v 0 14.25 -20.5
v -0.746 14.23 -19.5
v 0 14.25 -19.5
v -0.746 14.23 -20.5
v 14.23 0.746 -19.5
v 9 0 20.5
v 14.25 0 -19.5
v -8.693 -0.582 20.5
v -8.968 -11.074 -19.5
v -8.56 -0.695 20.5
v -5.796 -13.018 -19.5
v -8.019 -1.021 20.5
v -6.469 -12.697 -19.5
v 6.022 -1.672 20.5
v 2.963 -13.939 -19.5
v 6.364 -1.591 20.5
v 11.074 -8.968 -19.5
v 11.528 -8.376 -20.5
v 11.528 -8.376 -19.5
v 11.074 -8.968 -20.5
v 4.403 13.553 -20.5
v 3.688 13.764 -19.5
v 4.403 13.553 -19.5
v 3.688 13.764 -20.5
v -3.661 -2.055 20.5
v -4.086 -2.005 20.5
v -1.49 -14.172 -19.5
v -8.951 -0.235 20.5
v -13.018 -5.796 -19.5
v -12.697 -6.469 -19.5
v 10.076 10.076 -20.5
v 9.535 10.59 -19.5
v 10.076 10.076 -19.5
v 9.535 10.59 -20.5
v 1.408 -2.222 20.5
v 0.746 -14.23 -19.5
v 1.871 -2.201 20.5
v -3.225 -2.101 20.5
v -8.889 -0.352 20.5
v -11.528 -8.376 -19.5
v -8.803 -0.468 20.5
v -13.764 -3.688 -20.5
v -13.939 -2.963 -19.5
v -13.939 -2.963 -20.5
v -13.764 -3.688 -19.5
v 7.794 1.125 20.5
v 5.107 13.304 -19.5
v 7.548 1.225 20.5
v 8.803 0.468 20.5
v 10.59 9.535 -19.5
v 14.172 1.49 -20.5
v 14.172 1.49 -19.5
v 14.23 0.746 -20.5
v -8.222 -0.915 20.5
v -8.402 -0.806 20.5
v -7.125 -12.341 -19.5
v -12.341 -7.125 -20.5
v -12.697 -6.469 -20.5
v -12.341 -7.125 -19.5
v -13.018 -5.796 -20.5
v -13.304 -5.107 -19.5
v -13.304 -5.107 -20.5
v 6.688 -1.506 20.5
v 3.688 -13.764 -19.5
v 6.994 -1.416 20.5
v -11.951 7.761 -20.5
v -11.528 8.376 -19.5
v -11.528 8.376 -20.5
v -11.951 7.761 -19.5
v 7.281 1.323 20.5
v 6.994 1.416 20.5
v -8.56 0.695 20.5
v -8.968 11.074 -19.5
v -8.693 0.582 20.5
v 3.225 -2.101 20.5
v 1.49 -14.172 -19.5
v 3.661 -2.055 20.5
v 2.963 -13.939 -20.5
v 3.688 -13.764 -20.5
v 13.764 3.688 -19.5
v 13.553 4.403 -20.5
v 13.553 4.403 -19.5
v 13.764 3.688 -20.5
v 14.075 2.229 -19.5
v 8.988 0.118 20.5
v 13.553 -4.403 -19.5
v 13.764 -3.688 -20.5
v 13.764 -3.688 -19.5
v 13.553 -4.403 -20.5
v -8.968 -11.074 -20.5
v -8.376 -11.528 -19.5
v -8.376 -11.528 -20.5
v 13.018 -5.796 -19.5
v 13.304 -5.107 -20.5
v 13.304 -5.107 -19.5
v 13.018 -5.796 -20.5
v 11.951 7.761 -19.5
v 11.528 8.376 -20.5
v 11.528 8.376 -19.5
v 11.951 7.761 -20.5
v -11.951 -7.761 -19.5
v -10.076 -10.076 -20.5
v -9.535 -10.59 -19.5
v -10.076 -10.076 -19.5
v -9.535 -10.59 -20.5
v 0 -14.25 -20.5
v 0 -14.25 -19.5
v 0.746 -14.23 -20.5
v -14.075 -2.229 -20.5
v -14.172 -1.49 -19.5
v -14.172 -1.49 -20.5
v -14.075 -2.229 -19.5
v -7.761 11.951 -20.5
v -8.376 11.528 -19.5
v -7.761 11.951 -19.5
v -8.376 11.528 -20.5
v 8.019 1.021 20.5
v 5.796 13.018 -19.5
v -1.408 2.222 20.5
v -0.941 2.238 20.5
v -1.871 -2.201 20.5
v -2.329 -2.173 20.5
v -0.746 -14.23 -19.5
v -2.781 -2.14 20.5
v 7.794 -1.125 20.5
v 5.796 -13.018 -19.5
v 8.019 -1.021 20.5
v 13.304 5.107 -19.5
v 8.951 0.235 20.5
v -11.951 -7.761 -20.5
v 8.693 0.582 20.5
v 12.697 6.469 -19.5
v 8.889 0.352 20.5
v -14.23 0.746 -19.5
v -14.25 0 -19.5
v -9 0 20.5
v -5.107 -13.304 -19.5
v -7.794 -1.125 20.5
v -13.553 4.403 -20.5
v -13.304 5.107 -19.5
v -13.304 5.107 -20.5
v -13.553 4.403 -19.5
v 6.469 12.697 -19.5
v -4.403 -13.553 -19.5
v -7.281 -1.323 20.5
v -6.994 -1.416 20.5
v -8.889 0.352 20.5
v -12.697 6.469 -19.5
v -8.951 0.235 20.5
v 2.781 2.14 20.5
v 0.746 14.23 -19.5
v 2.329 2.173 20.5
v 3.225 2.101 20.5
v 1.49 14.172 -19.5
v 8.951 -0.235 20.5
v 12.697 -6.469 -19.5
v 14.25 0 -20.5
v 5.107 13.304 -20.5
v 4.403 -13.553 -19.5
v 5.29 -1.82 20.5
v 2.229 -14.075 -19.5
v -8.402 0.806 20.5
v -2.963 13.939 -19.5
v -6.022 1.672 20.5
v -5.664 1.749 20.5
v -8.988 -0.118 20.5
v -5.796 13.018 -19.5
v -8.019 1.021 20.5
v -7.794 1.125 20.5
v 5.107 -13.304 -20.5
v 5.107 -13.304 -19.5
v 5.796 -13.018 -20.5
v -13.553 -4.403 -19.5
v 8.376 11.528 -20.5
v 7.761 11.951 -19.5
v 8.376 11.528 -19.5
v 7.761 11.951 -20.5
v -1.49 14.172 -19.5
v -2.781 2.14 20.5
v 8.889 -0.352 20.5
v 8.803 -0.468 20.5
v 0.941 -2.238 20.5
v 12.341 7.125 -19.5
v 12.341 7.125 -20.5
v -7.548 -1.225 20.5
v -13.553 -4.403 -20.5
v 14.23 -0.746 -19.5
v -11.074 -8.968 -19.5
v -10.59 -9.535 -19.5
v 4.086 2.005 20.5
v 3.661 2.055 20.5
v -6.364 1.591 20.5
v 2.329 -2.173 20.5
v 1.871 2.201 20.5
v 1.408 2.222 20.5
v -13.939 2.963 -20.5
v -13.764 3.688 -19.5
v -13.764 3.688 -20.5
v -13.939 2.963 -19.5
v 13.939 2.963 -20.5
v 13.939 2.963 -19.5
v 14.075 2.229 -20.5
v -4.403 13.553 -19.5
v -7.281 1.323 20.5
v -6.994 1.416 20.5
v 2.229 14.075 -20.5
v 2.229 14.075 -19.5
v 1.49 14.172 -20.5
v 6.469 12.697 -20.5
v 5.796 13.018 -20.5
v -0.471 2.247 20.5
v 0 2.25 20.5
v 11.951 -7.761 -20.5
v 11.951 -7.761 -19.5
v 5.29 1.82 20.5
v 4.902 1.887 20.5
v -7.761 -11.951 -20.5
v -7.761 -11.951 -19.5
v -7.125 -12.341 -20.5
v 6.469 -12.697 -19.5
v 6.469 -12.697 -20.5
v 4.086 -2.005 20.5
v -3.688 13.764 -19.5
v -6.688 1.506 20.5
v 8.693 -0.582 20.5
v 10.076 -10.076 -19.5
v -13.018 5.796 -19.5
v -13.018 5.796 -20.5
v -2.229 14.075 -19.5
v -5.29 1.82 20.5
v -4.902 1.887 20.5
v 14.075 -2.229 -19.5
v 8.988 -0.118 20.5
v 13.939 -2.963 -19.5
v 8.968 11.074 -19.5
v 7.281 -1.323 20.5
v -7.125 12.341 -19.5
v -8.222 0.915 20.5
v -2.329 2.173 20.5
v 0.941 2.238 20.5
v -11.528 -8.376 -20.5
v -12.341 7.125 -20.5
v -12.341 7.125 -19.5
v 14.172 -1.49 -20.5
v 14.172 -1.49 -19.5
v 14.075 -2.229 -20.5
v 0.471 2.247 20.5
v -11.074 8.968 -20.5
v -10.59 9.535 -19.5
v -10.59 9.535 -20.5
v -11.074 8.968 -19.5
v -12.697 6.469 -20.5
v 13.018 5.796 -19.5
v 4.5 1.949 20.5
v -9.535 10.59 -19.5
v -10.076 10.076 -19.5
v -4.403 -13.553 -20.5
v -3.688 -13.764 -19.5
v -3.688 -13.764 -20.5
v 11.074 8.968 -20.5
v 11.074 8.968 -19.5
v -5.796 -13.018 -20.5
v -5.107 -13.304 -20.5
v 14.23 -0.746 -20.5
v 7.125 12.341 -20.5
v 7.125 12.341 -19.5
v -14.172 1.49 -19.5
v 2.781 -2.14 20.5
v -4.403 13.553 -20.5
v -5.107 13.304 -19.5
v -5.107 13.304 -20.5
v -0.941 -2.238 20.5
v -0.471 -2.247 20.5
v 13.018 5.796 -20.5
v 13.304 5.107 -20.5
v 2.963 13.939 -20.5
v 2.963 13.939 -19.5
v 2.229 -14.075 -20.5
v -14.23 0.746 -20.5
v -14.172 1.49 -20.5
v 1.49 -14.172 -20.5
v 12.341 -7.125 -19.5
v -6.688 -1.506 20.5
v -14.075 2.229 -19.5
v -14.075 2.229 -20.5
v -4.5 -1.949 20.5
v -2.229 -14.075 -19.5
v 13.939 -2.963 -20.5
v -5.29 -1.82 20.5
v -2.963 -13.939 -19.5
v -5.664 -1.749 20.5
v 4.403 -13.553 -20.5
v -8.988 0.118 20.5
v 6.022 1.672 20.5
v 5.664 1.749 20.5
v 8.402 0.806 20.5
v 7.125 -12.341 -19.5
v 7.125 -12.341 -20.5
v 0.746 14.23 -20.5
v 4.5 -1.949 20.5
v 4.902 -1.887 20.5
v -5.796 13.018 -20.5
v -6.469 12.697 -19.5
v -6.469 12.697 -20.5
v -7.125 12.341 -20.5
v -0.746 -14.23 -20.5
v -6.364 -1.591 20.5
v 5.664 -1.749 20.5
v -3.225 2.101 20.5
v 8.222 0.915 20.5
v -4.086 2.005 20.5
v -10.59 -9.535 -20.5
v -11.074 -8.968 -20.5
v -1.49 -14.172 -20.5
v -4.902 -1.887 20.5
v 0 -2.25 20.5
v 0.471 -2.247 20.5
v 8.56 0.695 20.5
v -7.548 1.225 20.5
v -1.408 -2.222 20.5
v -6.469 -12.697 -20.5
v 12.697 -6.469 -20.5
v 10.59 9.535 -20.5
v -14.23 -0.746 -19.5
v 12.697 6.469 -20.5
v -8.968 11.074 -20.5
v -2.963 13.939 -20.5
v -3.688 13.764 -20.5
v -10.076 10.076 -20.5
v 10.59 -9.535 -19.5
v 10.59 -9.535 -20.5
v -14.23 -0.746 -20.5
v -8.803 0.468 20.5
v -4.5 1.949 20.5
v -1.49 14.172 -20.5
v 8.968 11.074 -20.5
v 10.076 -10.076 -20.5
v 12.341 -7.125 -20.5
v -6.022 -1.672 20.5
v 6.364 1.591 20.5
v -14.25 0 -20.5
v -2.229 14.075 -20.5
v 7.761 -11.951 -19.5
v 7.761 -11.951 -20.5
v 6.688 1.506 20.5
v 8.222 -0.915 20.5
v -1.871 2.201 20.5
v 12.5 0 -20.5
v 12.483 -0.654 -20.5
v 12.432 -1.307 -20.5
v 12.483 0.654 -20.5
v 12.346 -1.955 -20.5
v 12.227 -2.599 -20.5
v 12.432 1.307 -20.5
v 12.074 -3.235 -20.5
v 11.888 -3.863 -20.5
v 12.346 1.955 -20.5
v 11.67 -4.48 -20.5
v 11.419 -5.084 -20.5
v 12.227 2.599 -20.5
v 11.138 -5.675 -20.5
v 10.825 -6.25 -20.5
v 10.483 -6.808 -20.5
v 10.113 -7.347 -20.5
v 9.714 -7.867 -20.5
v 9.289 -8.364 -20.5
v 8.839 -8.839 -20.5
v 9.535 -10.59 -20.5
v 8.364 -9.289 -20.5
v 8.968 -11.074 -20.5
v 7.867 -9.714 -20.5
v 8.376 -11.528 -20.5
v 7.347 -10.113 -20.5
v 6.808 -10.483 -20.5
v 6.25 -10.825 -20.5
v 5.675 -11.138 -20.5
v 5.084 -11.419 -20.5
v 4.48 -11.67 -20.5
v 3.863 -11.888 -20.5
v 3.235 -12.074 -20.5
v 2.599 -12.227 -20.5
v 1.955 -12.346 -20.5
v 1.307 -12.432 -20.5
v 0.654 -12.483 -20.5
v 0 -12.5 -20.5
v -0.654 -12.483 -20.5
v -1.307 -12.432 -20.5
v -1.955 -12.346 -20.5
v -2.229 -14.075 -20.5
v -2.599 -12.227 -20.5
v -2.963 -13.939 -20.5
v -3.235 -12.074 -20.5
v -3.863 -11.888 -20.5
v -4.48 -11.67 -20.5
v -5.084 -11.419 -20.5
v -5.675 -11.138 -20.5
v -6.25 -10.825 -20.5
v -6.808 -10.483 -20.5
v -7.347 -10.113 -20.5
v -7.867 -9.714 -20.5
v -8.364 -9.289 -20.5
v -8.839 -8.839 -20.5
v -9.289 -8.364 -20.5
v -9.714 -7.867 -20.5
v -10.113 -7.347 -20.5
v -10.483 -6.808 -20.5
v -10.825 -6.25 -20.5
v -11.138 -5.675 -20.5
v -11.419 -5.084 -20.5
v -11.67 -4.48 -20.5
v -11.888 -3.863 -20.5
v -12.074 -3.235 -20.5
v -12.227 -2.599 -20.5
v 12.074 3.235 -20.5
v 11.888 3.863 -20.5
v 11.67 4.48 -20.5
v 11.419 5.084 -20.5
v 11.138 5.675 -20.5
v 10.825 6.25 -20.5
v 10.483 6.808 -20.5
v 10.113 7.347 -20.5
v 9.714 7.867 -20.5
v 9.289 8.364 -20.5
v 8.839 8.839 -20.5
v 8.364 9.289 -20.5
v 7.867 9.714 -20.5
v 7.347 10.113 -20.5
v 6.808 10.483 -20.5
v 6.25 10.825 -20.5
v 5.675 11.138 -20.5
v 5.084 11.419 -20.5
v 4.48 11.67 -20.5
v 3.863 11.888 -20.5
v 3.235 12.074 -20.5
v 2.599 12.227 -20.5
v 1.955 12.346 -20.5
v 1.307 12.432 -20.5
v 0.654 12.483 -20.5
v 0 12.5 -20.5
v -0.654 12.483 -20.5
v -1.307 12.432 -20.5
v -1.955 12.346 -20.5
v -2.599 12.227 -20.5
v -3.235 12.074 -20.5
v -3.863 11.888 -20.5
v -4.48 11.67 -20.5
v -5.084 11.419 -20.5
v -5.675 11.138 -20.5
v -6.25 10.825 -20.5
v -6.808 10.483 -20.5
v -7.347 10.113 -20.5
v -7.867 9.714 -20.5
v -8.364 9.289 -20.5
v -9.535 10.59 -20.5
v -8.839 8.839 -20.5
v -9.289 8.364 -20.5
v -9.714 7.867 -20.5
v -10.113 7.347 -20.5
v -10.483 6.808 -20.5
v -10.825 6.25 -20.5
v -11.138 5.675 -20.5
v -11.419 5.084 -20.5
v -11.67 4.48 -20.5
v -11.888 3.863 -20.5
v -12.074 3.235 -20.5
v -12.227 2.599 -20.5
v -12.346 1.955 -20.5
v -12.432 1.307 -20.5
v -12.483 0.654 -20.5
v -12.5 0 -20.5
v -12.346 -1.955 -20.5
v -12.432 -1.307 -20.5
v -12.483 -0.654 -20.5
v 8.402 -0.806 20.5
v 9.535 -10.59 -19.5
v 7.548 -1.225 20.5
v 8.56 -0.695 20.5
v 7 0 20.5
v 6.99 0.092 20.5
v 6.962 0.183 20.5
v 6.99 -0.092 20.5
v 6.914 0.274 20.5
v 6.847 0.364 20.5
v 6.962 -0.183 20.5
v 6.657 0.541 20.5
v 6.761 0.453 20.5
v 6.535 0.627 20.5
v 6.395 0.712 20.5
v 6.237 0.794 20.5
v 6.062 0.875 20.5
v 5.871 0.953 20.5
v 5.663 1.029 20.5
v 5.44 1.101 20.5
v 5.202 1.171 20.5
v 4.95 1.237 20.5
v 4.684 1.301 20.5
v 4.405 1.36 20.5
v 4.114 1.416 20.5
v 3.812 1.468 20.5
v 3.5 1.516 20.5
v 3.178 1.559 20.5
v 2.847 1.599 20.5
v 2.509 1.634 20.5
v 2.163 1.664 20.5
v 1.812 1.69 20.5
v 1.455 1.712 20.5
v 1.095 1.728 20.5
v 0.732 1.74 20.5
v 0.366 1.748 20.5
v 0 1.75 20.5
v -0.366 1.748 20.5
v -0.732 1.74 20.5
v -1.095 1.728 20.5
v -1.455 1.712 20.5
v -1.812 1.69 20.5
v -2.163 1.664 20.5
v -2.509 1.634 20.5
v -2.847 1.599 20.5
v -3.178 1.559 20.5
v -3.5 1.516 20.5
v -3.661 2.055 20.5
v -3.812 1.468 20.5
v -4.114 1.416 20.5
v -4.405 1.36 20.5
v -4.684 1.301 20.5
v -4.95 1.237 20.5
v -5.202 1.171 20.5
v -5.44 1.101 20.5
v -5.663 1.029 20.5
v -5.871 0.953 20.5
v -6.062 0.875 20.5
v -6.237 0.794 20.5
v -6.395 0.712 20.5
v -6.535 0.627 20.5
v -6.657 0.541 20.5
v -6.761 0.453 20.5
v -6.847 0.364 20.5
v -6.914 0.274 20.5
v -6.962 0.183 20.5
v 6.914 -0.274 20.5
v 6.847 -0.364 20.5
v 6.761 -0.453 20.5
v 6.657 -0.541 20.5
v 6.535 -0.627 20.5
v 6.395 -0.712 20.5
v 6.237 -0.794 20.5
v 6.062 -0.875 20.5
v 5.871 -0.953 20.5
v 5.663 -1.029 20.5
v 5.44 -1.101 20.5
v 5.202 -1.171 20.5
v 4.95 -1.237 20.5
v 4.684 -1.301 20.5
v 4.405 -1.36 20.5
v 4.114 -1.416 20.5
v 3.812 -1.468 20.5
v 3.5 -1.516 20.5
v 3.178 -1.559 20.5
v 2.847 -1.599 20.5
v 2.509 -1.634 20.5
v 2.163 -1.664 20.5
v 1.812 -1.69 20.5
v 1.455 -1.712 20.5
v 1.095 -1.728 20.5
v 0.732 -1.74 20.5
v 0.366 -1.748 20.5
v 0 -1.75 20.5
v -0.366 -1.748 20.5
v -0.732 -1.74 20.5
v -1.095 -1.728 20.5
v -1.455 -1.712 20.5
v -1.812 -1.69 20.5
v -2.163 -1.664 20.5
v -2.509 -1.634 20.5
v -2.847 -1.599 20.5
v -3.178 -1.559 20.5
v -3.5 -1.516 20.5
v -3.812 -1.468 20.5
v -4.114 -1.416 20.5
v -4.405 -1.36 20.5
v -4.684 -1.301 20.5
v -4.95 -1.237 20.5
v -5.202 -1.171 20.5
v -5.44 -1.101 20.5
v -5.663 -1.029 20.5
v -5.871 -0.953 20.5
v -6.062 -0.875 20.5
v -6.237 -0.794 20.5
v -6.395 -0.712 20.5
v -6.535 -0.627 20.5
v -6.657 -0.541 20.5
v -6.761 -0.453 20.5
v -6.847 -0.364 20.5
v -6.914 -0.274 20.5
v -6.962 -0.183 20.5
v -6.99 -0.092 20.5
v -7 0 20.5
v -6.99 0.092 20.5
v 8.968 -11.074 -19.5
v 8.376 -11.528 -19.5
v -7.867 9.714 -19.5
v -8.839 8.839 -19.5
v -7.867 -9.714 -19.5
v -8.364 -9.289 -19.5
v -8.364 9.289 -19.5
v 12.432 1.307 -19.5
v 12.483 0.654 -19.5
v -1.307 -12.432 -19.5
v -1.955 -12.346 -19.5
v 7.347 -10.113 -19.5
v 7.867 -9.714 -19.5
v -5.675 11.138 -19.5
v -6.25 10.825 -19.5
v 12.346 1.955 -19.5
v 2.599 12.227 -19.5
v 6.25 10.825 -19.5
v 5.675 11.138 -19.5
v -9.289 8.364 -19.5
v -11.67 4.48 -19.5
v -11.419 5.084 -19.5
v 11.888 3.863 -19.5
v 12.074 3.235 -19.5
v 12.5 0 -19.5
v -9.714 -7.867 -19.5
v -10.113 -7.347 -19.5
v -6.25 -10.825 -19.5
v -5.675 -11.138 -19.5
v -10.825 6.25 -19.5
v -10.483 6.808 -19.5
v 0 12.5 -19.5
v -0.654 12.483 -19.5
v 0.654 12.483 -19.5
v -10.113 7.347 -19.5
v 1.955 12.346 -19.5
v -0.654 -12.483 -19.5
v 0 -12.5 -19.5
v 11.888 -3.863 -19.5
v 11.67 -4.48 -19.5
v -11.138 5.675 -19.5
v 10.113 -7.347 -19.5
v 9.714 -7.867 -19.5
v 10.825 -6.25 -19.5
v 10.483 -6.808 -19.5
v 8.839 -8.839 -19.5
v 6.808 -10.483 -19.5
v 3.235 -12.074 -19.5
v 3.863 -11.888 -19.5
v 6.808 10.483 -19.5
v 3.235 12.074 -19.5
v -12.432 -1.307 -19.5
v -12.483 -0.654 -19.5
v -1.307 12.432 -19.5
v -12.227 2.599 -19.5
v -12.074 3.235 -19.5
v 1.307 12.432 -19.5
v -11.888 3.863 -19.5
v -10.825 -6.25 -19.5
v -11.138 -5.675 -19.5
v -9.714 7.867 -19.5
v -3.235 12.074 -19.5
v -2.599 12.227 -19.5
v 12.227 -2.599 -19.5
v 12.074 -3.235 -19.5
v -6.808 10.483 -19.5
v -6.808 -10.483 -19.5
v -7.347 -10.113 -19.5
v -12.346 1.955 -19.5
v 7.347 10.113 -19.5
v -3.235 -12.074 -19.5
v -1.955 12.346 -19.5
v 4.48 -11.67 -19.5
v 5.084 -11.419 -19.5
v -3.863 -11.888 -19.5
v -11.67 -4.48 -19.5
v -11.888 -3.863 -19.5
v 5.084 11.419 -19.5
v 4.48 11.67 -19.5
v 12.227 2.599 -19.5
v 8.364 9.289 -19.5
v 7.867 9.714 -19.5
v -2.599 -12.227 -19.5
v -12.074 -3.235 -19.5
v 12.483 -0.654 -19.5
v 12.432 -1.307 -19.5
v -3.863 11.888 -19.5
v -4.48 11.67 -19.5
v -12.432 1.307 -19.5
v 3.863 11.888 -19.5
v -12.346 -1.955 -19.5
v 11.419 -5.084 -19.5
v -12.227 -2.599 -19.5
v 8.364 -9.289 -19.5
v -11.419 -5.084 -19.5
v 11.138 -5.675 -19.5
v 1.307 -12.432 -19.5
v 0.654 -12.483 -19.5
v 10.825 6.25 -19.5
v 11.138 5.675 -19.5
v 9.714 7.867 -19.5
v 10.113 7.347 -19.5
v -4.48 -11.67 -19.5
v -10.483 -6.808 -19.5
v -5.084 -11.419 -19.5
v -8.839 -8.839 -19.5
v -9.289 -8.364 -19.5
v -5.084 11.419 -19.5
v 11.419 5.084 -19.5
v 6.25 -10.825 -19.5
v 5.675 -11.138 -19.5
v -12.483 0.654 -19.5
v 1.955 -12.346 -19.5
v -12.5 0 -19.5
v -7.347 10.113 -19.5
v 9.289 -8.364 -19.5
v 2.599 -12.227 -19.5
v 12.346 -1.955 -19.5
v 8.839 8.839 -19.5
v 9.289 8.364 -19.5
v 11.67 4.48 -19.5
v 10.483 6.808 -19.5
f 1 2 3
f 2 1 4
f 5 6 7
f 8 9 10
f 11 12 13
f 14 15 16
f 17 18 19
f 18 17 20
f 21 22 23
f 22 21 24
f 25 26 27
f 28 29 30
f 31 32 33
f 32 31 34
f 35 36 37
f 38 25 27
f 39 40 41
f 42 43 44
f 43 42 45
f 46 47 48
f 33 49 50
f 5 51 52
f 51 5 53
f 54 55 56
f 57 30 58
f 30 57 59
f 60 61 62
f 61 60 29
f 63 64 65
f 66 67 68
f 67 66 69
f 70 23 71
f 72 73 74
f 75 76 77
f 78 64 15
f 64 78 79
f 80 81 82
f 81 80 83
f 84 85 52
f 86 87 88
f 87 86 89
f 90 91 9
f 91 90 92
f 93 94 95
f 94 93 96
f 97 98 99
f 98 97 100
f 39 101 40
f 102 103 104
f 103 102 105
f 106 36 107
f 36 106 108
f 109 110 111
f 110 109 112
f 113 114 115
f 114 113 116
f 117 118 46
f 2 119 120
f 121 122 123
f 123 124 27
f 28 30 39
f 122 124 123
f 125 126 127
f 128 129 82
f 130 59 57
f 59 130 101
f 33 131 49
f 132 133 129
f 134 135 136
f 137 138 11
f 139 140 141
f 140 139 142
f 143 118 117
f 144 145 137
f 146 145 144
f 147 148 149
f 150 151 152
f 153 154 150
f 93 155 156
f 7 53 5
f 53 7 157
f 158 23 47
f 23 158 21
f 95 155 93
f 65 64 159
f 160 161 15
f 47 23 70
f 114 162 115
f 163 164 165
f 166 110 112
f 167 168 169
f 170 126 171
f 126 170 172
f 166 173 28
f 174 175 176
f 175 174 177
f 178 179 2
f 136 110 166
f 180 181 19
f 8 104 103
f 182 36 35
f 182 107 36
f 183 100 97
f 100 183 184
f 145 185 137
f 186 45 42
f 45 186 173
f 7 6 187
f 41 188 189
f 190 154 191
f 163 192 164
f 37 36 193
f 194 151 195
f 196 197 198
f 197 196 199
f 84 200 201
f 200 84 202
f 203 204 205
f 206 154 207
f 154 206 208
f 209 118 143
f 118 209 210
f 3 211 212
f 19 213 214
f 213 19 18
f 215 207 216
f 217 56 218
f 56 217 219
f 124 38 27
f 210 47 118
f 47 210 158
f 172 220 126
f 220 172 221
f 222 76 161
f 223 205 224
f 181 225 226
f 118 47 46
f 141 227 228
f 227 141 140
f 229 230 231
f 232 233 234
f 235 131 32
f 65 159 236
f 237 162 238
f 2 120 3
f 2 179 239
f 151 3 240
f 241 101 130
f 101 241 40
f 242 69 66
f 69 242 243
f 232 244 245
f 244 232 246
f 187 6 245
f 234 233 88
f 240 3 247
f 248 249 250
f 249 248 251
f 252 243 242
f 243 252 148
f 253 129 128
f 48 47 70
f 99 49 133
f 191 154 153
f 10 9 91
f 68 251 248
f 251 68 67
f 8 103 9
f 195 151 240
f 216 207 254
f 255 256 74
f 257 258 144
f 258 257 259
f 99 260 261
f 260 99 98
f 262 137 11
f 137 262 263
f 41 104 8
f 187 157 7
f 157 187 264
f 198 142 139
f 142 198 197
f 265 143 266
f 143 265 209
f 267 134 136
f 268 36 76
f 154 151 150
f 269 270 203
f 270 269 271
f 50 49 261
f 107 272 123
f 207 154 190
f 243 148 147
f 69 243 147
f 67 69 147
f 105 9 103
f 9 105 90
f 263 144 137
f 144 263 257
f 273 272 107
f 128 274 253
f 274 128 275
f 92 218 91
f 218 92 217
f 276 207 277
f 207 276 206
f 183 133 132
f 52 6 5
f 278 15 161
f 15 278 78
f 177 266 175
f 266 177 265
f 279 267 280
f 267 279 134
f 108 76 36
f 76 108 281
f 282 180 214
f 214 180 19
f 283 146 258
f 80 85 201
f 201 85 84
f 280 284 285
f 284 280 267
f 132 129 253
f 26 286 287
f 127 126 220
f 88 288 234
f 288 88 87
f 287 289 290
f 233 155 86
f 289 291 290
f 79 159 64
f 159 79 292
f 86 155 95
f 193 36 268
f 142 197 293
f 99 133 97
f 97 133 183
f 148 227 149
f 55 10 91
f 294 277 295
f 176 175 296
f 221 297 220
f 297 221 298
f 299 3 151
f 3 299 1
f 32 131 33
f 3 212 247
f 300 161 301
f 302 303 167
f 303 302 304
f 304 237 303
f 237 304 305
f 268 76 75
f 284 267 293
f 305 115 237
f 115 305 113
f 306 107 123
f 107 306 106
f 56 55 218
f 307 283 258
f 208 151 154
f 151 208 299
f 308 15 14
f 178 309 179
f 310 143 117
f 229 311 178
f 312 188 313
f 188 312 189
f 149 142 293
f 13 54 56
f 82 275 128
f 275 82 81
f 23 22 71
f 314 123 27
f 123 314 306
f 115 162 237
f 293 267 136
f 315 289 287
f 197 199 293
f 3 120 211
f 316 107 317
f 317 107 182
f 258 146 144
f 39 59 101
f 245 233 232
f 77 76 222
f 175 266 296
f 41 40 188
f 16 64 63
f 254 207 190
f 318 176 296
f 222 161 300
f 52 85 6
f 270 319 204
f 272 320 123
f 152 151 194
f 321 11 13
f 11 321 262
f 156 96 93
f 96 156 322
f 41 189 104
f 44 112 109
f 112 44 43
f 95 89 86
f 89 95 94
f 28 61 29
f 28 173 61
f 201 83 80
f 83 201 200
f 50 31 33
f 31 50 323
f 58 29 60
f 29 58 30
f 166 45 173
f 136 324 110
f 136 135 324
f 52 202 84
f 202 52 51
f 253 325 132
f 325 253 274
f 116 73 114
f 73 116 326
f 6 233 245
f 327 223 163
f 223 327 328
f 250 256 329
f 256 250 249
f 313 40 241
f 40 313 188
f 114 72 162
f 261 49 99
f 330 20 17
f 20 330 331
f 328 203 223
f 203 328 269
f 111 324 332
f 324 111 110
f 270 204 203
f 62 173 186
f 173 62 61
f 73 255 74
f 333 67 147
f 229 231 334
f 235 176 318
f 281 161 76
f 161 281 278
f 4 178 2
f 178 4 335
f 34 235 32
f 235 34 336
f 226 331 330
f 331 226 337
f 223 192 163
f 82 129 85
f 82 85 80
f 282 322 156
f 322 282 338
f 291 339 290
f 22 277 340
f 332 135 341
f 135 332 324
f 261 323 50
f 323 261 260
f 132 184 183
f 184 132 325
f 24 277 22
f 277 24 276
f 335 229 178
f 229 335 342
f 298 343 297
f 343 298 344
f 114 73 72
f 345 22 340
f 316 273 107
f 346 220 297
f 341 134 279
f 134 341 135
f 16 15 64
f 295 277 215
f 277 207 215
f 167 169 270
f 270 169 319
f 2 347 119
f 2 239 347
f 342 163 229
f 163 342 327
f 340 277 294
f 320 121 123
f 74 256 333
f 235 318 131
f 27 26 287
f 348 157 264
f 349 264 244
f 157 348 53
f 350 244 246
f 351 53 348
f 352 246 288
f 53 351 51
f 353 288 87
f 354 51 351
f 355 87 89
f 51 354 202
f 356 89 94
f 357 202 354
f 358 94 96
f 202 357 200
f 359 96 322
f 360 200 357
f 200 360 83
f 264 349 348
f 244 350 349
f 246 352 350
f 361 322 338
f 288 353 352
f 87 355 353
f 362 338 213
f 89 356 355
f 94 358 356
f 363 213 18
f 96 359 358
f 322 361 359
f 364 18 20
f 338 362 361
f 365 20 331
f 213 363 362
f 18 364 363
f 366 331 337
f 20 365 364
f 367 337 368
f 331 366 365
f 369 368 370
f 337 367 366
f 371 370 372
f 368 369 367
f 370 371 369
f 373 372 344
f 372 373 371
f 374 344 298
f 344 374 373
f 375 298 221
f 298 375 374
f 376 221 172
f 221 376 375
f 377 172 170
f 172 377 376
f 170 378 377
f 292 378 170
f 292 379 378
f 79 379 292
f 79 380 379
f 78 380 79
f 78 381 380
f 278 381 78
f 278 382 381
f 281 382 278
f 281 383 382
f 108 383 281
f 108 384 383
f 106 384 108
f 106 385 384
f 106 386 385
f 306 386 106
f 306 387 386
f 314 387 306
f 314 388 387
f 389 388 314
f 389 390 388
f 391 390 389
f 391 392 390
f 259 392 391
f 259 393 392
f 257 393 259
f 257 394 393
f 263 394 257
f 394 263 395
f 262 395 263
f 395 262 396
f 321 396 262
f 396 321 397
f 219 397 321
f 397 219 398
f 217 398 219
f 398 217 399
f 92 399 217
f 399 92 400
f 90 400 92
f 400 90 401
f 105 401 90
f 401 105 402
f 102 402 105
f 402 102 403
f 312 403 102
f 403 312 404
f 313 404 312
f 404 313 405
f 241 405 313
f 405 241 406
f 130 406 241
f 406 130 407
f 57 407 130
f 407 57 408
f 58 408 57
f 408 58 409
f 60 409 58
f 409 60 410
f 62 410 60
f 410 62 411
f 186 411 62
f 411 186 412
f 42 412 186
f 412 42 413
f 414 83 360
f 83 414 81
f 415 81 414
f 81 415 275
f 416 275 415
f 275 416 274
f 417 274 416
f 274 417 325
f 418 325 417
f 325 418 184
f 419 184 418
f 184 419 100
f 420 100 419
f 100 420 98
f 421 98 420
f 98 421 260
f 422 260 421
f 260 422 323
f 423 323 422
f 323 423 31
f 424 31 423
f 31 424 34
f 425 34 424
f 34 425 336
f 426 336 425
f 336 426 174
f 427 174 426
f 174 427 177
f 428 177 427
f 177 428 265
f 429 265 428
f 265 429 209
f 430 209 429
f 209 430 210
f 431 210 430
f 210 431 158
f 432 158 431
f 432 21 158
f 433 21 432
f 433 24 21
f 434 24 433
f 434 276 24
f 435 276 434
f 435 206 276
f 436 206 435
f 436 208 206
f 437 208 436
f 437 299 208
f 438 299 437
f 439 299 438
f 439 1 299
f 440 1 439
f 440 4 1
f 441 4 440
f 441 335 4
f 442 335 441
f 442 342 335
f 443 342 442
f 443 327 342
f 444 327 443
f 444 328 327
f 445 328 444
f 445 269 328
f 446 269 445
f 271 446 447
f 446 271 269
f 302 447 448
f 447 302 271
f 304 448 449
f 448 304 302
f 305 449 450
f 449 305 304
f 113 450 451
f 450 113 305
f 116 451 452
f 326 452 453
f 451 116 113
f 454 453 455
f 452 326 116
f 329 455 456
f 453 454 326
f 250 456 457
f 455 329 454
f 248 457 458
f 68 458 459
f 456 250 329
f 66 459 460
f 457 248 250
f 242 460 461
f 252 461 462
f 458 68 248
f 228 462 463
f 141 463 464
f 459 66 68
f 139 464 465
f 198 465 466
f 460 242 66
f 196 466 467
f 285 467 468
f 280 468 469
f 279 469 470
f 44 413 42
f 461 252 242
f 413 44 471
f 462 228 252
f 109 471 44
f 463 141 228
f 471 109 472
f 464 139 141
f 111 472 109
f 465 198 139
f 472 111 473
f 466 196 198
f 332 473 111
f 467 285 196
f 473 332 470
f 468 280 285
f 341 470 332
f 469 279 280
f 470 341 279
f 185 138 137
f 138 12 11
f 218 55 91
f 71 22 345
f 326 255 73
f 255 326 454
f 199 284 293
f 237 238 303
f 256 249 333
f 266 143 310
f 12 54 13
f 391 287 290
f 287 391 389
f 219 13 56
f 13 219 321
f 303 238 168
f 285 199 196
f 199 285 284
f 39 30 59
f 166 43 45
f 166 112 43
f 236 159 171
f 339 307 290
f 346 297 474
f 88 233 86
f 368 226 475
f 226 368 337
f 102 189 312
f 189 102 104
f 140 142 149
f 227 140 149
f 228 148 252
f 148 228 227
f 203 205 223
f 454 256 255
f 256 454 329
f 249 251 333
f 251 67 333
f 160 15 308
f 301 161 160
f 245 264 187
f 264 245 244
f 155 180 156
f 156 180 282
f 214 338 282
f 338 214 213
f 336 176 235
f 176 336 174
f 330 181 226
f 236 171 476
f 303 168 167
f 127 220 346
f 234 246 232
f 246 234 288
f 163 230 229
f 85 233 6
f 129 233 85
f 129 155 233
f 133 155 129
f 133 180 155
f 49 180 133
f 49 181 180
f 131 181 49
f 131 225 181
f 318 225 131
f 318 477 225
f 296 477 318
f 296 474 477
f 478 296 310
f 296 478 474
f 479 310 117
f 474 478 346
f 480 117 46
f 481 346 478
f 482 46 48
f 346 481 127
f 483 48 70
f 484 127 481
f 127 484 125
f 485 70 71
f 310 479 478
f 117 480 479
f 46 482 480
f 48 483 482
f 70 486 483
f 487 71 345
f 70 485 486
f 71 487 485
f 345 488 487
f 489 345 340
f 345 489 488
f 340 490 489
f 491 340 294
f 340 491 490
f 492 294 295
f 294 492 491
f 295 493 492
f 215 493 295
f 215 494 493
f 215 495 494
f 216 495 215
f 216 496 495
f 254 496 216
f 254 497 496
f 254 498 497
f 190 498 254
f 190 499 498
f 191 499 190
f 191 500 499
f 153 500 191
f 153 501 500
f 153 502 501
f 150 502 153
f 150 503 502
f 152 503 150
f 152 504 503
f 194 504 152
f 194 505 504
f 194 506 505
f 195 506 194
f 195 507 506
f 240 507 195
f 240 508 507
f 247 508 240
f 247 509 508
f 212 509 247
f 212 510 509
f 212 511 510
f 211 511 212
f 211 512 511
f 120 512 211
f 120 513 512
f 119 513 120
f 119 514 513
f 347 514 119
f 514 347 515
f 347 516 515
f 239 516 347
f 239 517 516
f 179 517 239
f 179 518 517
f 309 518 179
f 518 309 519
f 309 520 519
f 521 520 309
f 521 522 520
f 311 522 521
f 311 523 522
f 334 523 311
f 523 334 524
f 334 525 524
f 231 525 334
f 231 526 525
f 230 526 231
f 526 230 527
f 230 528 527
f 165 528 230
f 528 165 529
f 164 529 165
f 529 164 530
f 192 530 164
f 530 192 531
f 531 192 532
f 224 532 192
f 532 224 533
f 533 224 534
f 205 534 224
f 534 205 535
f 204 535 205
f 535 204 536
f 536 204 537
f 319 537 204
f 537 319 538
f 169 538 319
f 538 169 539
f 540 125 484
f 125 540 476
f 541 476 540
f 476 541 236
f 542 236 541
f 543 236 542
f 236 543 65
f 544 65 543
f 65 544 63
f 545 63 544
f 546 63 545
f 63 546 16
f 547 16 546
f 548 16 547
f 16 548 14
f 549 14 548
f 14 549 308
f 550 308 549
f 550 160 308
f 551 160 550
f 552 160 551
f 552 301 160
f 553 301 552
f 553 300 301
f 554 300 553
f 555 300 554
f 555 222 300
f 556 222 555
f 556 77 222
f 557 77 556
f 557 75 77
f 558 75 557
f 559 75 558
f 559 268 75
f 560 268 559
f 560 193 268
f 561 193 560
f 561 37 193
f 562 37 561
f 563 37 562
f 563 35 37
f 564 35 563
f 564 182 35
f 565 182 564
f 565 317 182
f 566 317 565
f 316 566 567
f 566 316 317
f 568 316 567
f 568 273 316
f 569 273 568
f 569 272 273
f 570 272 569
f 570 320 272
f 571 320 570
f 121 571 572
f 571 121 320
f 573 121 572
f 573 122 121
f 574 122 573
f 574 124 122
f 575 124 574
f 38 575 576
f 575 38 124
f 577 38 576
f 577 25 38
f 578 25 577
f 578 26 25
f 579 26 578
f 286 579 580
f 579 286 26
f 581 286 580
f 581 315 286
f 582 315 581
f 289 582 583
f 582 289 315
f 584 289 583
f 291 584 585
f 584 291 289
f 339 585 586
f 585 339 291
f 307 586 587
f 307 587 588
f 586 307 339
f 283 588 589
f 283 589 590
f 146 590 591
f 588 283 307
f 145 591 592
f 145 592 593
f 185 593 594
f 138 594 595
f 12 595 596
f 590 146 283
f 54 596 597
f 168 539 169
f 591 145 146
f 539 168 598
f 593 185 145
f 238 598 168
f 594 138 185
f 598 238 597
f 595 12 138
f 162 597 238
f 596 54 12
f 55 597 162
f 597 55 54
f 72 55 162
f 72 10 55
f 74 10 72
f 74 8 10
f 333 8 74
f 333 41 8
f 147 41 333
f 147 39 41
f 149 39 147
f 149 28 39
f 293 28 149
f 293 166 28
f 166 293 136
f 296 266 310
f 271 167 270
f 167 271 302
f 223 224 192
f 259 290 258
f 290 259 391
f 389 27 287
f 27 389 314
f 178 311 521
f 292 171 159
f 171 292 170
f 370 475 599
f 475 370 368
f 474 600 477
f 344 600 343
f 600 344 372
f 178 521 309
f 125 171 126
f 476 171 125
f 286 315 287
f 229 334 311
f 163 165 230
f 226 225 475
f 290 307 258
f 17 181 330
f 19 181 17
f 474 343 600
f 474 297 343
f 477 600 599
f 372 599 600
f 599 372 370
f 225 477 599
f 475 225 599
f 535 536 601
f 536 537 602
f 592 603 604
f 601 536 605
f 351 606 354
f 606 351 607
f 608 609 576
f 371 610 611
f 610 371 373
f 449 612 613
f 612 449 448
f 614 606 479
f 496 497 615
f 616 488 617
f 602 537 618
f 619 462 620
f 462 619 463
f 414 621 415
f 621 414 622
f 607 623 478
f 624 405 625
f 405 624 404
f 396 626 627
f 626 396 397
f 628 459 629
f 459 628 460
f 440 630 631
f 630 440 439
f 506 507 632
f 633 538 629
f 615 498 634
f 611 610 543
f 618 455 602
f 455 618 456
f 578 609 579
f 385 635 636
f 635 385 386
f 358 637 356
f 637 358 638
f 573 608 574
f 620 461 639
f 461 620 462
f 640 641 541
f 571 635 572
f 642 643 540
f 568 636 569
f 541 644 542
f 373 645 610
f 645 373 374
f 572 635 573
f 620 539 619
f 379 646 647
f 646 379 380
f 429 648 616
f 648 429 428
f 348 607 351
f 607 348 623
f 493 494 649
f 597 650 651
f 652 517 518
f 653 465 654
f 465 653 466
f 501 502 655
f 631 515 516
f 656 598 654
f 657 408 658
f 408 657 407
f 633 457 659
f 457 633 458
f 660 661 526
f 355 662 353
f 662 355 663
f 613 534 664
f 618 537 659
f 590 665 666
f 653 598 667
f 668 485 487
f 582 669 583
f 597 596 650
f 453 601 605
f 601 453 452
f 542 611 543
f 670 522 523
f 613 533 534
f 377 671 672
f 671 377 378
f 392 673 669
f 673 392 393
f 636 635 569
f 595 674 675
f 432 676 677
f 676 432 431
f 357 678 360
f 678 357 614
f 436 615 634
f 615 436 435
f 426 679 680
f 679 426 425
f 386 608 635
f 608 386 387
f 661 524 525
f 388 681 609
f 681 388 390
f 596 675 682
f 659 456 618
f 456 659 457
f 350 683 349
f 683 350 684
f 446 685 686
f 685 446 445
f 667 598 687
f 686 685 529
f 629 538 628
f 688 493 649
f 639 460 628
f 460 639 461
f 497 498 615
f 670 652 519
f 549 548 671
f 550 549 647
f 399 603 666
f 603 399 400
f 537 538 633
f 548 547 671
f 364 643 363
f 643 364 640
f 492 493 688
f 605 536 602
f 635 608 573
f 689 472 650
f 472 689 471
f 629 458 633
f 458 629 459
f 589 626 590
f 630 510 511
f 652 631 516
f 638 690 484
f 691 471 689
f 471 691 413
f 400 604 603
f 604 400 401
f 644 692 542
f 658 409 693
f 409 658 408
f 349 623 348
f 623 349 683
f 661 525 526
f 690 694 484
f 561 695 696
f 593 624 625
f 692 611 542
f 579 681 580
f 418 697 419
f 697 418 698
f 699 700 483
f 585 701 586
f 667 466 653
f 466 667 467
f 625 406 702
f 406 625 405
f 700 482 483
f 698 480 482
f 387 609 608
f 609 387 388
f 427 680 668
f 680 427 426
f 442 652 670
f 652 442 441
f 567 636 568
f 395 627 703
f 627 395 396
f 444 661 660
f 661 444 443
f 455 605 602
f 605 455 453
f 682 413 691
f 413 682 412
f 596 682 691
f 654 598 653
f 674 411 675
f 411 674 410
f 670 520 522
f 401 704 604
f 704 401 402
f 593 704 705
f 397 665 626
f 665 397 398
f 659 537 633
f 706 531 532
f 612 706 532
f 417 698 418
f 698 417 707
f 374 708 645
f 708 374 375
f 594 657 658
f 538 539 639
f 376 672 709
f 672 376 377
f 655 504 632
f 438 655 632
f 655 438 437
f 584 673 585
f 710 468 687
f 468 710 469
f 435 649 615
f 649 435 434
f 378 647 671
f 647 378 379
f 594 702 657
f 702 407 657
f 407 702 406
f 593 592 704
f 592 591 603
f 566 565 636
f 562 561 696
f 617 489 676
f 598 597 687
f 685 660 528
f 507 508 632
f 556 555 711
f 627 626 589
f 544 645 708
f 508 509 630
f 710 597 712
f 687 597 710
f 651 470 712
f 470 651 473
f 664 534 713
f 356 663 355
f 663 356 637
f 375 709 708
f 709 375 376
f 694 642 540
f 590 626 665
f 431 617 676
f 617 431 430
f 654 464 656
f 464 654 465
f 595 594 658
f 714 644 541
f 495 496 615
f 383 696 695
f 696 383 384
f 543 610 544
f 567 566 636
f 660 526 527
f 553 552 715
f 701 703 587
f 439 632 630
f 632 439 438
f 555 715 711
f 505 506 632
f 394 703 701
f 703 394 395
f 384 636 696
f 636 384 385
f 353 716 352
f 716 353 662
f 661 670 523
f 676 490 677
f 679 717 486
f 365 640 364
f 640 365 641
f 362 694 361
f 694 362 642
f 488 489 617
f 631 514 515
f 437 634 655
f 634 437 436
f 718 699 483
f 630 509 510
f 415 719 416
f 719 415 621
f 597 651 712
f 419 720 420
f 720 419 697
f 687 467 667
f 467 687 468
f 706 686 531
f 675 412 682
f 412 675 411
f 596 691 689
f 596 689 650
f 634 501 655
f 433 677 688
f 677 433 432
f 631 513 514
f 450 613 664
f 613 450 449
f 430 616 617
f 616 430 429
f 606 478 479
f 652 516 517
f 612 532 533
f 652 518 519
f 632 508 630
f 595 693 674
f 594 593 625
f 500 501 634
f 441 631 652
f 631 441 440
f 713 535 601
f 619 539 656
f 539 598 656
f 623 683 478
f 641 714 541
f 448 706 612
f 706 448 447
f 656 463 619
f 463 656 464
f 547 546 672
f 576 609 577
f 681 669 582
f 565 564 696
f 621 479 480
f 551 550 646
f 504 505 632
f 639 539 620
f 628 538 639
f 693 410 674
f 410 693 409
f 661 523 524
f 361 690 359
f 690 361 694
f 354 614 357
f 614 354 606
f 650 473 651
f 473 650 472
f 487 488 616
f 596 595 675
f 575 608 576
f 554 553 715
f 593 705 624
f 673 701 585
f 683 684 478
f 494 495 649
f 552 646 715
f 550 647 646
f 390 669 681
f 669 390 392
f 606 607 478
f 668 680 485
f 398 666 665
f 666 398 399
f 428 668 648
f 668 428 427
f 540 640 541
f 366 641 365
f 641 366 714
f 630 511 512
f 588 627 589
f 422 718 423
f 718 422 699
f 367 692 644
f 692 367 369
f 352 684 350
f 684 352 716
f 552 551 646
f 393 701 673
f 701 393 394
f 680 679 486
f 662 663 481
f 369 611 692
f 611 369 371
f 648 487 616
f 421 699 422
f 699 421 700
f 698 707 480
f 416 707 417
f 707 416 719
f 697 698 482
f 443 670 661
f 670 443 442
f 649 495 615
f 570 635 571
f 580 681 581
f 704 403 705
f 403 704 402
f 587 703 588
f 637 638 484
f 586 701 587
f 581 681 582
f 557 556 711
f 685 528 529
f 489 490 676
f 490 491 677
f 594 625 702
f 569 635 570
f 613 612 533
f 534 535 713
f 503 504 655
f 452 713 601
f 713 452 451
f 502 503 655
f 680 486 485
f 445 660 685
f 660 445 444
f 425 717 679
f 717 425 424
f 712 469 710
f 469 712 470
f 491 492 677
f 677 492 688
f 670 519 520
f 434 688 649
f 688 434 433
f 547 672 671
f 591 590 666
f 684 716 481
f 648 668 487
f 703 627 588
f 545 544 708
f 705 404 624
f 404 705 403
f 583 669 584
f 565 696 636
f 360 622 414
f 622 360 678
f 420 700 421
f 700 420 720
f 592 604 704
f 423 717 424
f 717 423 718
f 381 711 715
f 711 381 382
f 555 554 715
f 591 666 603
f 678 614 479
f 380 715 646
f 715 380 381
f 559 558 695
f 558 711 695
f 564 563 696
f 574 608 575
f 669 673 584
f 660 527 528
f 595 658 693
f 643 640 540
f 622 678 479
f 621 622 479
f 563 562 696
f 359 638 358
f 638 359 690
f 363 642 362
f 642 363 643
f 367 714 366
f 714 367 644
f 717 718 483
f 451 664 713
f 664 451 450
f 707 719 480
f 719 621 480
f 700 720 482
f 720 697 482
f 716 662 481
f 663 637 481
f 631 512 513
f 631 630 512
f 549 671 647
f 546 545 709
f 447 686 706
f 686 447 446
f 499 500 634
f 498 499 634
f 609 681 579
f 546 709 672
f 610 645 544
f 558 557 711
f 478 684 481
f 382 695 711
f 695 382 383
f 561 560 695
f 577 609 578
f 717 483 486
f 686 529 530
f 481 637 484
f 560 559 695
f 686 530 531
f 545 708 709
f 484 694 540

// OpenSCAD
/*
    Nozzle Creation Script
        - built for generating nozzles
        - my specific use is for laying grout
*/

//Wider nozzle end, inner diameter
lower_dia_in = 25; //[20:0.5:100]

//Thinner nozzle end, innet diameter
upper_dia_in = 7; //[4:0.1:50]

//length from bottom to top
length = 40; //[8:0.1:150]

//Nozzle X Scale
nozzle_x_scale = 2.0; //[0.25:0.1:2.0]

//Nozzle Y Scale
nozzle_y_scale = 0.5; //[0.25:0.1:2.0]

//Wall thickness at base
wall_thickness_upper = 2; //[1:0.1:15]

//Wall thickness at nozzle
wall_thickness_lower = 3.5; //[1:0.1:20]

//Smoothness - Resolution of the circles
resolution = 120; //[32:1:240]


//RENDER
difference(){
    outer_wall();
    inner_wall();
}

//MODULES
module outer_wall(){
    hull(){
translate([0,0,length/2]){
upper_nozzle(wall_thickness_upper);
}

translate([0,0,-length/2]){
lower_nozzle(wall_thickness_lower);
}
}
}

module inner_wall(){
    hull(){
translate([0,0,length/2]){
upper_nozzle(0);
}

translate([0,0,-length/2]){
lower_nozzle(0);
}
}
}


module lower_nozzle(thickness){
    cylinder(h = 1, d = lower_dia_in + thickness, center = true, $fn = resolution); 
}

module upper_nozzle(thickness){
    scale([nozzle_x_scale, nozzle_y_scale,1]){
            cylinder(h = 1, d = upper_dia_in + thickness, center = true, $fn = resolution); 
    }
}
